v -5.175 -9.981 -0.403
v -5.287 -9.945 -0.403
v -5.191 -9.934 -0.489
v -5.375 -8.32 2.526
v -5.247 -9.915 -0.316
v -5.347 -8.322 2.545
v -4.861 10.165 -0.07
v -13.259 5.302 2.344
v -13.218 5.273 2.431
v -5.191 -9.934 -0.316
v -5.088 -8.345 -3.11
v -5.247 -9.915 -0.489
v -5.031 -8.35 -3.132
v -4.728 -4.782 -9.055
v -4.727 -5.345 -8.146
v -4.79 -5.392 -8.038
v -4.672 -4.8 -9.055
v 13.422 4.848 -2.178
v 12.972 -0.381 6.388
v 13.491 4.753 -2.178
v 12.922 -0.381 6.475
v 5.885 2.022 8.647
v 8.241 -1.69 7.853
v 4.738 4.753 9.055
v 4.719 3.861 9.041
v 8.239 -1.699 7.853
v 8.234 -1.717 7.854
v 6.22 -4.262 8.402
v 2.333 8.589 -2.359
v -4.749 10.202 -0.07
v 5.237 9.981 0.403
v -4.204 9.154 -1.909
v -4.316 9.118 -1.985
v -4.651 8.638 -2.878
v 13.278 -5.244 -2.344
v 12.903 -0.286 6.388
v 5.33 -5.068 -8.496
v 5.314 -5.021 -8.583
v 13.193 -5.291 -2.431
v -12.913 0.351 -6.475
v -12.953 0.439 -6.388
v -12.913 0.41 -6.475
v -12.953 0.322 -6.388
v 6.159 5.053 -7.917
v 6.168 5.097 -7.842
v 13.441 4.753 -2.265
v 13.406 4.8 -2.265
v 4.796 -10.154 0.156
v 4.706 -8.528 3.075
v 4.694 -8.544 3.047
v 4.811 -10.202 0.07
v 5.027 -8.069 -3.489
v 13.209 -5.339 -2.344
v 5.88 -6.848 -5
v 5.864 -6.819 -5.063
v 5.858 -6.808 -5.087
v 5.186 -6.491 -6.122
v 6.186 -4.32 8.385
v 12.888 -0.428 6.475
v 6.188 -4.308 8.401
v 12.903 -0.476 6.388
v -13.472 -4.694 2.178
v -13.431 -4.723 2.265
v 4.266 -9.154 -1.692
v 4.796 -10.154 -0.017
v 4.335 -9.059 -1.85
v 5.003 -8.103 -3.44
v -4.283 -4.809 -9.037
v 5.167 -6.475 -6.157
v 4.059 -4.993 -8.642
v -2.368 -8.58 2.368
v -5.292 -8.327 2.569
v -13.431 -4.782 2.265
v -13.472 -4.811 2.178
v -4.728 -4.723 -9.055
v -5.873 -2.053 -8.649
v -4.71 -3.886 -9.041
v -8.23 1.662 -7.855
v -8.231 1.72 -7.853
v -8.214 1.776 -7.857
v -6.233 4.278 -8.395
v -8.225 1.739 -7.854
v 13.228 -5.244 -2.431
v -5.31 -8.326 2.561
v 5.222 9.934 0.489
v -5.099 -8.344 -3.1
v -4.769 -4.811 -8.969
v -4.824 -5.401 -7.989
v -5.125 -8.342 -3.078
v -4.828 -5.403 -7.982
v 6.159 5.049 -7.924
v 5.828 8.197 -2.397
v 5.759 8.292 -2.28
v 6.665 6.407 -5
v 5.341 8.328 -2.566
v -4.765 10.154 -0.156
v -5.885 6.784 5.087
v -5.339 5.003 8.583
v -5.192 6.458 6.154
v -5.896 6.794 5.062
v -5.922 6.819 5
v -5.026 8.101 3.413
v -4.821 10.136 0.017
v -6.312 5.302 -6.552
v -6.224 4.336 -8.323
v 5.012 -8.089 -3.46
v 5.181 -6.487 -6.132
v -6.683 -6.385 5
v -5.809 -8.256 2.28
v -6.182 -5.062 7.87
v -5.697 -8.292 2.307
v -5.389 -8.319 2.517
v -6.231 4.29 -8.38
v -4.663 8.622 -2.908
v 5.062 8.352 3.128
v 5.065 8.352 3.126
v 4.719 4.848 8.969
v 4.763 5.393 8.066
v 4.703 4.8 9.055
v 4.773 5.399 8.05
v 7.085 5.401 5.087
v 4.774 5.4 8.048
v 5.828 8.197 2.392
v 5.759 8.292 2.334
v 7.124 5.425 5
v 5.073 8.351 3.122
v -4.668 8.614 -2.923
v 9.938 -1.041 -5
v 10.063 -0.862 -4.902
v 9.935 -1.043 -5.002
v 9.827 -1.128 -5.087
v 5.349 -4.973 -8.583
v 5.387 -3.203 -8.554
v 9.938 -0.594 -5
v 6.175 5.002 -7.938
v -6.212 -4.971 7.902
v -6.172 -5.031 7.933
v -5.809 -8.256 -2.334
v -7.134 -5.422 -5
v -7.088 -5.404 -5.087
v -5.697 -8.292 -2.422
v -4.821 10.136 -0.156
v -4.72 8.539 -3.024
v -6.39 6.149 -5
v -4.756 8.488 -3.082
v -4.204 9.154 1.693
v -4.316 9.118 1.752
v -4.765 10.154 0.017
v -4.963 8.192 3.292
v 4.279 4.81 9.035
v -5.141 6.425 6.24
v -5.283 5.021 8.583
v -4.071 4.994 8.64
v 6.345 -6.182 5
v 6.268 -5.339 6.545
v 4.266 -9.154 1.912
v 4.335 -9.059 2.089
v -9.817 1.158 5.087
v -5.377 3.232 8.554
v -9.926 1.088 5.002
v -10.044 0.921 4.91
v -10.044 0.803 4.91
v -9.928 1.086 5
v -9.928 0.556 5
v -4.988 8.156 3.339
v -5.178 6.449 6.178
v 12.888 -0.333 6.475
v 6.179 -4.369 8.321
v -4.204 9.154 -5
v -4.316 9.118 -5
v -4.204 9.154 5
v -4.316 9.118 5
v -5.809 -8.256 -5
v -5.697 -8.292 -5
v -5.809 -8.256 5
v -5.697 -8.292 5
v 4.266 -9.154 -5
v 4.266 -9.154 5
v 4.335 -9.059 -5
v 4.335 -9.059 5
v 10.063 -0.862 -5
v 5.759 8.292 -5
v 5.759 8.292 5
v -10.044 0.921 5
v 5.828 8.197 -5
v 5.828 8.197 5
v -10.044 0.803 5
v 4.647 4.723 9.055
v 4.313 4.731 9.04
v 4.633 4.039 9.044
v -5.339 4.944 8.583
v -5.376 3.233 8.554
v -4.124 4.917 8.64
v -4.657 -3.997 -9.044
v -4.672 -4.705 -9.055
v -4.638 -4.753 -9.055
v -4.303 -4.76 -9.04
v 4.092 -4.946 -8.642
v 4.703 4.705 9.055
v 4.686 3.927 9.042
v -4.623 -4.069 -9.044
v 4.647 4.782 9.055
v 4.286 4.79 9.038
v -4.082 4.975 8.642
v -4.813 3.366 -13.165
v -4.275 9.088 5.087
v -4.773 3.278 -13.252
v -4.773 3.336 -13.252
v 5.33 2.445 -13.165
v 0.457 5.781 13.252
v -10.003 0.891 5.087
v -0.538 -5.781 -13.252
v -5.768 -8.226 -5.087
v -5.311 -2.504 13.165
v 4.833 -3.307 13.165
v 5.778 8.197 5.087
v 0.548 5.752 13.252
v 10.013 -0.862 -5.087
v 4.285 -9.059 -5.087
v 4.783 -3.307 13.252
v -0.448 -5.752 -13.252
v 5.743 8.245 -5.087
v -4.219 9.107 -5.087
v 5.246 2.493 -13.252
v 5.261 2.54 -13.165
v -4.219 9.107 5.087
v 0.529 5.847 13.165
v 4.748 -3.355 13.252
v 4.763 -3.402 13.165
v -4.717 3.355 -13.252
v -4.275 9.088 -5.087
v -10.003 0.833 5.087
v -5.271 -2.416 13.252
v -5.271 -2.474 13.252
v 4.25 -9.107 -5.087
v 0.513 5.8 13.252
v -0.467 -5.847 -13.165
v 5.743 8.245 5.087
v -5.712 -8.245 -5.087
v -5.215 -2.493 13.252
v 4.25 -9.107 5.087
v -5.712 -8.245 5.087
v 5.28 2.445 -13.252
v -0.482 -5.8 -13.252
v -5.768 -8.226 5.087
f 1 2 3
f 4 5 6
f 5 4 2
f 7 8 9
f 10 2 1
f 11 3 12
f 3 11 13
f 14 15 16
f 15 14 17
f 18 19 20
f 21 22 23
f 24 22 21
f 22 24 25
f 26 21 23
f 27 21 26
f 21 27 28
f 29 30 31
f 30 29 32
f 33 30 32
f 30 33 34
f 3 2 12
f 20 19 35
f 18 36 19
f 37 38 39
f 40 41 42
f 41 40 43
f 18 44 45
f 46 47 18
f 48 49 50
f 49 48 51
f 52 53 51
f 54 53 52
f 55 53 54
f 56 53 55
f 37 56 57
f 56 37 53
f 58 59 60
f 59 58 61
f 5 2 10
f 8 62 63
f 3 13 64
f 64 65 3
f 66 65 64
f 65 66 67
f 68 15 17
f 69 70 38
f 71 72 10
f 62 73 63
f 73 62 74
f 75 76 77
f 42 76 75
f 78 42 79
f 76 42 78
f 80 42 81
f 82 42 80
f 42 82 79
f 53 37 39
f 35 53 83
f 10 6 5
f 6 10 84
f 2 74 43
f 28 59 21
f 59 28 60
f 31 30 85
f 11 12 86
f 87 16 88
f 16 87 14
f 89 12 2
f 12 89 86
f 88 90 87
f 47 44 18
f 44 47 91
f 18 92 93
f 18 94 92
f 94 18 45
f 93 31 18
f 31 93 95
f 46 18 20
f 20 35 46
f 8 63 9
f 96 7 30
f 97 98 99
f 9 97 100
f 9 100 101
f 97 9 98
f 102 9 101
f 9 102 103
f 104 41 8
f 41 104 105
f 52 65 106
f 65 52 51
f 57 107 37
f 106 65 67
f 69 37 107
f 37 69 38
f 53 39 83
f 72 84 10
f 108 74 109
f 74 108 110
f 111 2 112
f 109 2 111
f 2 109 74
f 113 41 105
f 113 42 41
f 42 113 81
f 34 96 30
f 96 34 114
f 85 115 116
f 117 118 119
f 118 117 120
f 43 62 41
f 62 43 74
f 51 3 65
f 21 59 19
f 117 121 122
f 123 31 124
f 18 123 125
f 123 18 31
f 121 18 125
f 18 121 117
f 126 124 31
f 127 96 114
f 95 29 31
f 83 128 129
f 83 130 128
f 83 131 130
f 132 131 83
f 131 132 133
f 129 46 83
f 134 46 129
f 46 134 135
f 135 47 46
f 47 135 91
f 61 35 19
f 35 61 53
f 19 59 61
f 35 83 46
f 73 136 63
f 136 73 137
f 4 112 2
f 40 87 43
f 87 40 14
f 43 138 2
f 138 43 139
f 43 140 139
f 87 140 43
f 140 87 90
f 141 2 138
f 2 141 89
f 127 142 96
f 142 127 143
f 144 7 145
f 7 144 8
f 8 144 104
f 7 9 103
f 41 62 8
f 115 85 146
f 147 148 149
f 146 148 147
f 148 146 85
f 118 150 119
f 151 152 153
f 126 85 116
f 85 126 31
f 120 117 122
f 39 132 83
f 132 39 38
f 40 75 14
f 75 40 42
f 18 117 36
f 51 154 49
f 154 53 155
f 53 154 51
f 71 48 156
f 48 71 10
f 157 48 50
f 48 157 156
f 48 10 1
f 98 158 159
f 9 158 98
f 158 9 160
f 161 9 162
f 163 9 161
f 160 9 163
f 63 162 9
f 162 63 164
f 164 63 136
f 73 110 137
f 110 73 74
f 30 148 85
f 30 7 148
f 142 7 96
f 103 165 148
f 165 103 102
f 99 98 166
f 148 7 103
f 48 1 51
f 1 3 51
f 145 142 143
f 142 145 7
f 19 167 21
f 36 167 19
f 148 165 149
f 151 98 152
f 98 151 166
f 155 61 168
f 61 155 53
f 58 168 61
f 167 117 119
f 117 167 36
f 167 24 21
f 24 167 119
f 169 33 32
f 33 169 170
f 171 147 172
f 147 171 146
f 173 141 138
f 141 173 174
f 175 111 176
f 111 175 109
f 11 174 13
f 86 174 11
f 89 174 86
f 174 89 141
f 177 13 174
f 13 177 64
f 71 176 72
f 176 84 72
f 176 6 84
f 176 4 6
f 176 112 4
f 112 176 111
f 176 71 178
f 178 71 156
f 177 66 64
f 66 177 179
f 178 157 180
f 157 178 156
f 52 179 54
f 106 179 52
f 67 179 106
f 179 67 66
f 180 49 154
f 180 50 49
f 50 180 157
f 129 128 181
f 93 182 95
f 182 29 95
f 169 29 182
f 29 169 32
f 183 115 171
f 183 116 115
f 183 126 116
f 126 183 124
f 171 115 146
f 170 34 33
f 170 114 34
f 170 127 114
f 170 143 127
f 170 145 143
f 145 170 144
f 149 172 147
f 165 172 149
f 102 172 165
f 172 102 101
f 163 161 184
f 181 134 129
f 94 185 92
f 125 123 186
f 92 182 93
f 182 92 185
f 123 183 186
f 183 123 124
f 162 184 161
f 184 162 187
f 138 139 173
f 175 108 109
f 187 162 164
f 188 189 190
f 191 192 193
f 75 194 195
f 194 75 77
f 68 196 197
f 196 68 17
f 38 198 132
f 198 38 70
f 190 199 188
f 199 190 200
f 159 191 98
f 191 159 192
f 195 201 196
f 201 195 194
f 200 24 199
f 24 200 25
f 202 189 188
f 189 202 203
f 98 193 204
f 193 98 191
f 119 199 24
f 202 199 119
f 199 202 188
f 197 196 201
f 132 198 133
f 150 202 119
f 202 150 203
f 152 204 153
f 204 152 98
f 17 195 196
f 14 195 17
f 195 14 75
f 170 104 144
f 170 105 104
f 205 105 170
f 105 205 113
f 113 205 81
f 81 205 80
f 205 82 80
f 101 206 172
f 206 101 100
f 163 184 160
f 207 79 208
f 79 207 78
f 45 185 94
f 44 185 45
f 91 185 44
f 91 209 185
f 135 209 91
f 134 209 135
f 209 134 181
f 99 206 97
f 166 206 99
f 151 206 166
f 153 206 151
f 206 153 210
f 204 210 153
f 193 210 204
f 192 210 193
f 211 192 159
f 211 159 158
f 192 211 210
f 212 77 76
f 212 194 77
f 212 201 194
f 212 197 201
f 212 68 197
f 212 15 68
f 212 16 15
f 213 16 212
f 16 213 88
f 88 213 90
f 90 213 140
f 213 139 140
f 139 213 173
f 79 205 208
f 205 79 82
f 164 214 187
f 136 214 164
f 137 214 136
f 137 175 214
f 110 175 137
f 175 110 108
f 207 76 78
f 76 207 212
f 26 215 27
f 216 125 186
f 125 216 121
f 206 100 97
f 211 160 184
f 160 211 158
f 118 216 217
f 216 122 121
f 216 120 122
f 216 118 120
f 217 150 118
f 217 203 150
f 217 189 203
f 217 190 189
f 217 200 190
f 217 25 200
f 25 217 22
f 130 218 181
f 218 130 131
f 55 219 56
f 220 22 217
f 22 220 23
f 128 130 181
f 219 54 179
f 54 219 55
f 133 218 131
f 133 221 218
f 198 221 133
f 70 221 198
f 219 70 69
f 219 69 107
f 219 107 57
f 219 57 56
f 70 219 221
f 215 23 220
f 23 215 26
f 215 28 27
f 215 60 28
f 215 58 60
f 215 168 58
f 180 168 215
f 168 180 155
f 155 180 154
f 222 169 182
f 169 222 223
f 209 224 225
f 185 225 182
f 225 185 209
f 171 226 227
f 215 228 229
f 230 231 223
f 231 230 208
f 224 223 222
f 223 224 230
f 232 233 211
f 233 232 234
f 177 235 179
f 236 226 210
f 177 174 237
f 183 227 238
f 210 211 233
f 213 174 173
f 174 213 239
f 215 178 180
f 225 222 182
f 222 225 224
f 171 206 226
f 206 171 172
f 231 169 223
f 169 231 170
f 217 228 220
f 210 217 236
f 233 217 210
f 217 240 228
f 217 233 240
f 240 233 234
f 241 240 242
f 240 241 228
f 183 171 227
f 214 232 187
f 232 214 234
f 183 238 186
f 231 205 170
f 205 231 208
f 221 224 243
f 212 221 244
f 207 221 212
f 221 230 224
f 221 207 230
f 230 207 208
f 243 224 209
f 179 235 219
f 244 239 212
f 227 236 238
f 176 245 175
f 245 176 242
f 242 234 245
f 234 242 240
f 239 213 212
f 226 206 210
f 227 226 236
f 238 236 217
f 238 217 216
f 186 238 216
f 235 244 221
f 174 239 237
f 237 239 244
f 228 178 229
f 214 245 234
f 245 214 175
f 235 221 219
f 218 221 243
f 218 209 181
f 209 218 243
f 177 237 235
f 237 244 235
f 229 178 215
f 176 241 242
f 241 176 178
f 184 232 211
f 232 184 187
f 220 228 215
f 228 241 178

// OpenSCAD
// Auto-generated OpenSCAD file

    inner_points = 10*[[-0.5727942453287636, -0.8196991841635889, -0.49999999999979927], [0.572794245328764, 0.8196991841635887, 0.49999999999979927], [0.4234831942827272, -0.9059039596778707, 0.5000000000000533], [-0.42348319428272685, 0.9059039596778705, -0.5000000000000533], [0.9962774396112515, -0.08620477551448197, -0.5000000000001475], [-0.996277439611251, 0.08620477551448175, 0.5000000000001475], [0.9962774396114111, -0.08620477551434857, 0.49999999999985245], [-0.9962774396114107, 0.08620477551434835, -0.49999999999985245], [0.5727942453286043, 0.8196991841634554, -0.5000000000002008], [-0.5727942453286039, -0.8196991841634557, 0.5000000000002008], [0.42348319428256764, -0.905903959678004, -0.4999999999999469], [-0.4234831942825673, 0.9059039596780037, 0.4999999999999469], [0.5230238949797952, 0.24449813621619343, -1.3164965809278422], [-0.5230238949797947, -0.24449813621619365, 1.3164965809278422], [-0.049770350348888805, -0.5752010479473287, -1.3164965809276414], [0.04977035034888918, 0.5752010479473285, 1.3164965809276414], [-0.47325354463153607, 0.33070291173060856, -1.3164965809276947], [0.4732535446315364, -0.3307029117306088, 1.3164965809276947]];

    outer_points = 10*[[0.5298790273108971, -0.49733729572507634, -0.8496374701582584], [-0.5298790273108971, 0.49733729572507634, 0.8496374701582584], [-0.5206247255916664, -0.9885998081008317, -0.040253130631053124], [0.5206247255916664, 0.9885998081008317, 0.040253130631053124], [0.44745605235875646, -0.5243669819275101, 0.8802399385802442], [-0.44745605235875646, 0.5243669819275101, -0.8802399385802442], [-0.5511838178154568, -0.5022973355596736, 0.833002872544885], [0.5511838178154568, 0.5022973355596736, -0.833002872544885], [0.46876084286331626, 0.47526764935724, 0.8968745361936177], [-0.46876084286331626, -0.47526764935724, -0.8968745361936177], [0.4780151445825469, -1.010669454468668, 0.006983935404306196], [-0.4780151445825469, 1.010669454468668, -0.006983935404306196], [1.287231649678413, -0.038064509386351864, 0.6388132388414419], [-1.287231649678413, 0.038064509386351864, -0.6388132388414419], [1.3177907419022037, -0.5243669819275101, -0.23444276433449618], [-1.3177907419022037, 0.5243669819275101, 0.23444276433449618], [1.3390955324067635, 0.47526764935724, -0.2178081667211227], [-1.3390955324067635, -0.47526764935724, 0.2178081667211227]];

    // Convex hull for inner set (I)
    module inner_hull() {
        hull() {
            for (p = inner_points) {
                translate(p) sphere(r=0.1);
            }
        }
    }

    // Convex hull for outer set (O) minus inner hull (O \ I)
    module outer_minus_inner() {
        difference() {
            hull() {
                for (p = outer_points) {
                    translate(p) sphere(r=0.1);
                }
            }
            inner_hull(); // Subtract inner hull
        }
    }

    // Convex hull for outer set (O) minus all translated inner hulls
    module outer_minus_AllTranslationInner() {
        difference() {
            hull() {
                for (p = outer_points) {
                    translate(p) sphere(r=0.1);
                }
            }
            hull() {
                translate([0,0,50]) inner_hull();
                translate([0,0,-50]) inner_hull();
            }; // Subtract translated inner hulls
        }
    }

    // Difference between outer_minus_inner and outer_minus_AllTranslationInner
    module outer_minus_inner_diff() {
        difference() {
            // Outer minus inner
            difference() {
                hull() {
                    for (p = outer_points) {
                        translate(p) sphere(r=0.1);
                    }
                }
                inner_hull();
            }

            // Subtract Outer minus AllTranslationInner
            difference() {
                hull() {
                    for (p = outer_points) {
                        translate(p) sphere(r=0.1);
                    }
                }
                hull() {
                    translate([0,0,50]) inner_hull();
                    translate([0,0,-50]) inner_hull();
                };
            }
        }
    }

    // Rendering all with colors applied
    color([1, 0, 0, 0.5]) inner_hull(); // Transparent red
    color([0, 1, 0, 1]) outer_minus_AllTranslationInner(); // Opaque green
    color([1, 1, 0, 1]) outer_minus_inner_diff(); // Opaque yellow
    
